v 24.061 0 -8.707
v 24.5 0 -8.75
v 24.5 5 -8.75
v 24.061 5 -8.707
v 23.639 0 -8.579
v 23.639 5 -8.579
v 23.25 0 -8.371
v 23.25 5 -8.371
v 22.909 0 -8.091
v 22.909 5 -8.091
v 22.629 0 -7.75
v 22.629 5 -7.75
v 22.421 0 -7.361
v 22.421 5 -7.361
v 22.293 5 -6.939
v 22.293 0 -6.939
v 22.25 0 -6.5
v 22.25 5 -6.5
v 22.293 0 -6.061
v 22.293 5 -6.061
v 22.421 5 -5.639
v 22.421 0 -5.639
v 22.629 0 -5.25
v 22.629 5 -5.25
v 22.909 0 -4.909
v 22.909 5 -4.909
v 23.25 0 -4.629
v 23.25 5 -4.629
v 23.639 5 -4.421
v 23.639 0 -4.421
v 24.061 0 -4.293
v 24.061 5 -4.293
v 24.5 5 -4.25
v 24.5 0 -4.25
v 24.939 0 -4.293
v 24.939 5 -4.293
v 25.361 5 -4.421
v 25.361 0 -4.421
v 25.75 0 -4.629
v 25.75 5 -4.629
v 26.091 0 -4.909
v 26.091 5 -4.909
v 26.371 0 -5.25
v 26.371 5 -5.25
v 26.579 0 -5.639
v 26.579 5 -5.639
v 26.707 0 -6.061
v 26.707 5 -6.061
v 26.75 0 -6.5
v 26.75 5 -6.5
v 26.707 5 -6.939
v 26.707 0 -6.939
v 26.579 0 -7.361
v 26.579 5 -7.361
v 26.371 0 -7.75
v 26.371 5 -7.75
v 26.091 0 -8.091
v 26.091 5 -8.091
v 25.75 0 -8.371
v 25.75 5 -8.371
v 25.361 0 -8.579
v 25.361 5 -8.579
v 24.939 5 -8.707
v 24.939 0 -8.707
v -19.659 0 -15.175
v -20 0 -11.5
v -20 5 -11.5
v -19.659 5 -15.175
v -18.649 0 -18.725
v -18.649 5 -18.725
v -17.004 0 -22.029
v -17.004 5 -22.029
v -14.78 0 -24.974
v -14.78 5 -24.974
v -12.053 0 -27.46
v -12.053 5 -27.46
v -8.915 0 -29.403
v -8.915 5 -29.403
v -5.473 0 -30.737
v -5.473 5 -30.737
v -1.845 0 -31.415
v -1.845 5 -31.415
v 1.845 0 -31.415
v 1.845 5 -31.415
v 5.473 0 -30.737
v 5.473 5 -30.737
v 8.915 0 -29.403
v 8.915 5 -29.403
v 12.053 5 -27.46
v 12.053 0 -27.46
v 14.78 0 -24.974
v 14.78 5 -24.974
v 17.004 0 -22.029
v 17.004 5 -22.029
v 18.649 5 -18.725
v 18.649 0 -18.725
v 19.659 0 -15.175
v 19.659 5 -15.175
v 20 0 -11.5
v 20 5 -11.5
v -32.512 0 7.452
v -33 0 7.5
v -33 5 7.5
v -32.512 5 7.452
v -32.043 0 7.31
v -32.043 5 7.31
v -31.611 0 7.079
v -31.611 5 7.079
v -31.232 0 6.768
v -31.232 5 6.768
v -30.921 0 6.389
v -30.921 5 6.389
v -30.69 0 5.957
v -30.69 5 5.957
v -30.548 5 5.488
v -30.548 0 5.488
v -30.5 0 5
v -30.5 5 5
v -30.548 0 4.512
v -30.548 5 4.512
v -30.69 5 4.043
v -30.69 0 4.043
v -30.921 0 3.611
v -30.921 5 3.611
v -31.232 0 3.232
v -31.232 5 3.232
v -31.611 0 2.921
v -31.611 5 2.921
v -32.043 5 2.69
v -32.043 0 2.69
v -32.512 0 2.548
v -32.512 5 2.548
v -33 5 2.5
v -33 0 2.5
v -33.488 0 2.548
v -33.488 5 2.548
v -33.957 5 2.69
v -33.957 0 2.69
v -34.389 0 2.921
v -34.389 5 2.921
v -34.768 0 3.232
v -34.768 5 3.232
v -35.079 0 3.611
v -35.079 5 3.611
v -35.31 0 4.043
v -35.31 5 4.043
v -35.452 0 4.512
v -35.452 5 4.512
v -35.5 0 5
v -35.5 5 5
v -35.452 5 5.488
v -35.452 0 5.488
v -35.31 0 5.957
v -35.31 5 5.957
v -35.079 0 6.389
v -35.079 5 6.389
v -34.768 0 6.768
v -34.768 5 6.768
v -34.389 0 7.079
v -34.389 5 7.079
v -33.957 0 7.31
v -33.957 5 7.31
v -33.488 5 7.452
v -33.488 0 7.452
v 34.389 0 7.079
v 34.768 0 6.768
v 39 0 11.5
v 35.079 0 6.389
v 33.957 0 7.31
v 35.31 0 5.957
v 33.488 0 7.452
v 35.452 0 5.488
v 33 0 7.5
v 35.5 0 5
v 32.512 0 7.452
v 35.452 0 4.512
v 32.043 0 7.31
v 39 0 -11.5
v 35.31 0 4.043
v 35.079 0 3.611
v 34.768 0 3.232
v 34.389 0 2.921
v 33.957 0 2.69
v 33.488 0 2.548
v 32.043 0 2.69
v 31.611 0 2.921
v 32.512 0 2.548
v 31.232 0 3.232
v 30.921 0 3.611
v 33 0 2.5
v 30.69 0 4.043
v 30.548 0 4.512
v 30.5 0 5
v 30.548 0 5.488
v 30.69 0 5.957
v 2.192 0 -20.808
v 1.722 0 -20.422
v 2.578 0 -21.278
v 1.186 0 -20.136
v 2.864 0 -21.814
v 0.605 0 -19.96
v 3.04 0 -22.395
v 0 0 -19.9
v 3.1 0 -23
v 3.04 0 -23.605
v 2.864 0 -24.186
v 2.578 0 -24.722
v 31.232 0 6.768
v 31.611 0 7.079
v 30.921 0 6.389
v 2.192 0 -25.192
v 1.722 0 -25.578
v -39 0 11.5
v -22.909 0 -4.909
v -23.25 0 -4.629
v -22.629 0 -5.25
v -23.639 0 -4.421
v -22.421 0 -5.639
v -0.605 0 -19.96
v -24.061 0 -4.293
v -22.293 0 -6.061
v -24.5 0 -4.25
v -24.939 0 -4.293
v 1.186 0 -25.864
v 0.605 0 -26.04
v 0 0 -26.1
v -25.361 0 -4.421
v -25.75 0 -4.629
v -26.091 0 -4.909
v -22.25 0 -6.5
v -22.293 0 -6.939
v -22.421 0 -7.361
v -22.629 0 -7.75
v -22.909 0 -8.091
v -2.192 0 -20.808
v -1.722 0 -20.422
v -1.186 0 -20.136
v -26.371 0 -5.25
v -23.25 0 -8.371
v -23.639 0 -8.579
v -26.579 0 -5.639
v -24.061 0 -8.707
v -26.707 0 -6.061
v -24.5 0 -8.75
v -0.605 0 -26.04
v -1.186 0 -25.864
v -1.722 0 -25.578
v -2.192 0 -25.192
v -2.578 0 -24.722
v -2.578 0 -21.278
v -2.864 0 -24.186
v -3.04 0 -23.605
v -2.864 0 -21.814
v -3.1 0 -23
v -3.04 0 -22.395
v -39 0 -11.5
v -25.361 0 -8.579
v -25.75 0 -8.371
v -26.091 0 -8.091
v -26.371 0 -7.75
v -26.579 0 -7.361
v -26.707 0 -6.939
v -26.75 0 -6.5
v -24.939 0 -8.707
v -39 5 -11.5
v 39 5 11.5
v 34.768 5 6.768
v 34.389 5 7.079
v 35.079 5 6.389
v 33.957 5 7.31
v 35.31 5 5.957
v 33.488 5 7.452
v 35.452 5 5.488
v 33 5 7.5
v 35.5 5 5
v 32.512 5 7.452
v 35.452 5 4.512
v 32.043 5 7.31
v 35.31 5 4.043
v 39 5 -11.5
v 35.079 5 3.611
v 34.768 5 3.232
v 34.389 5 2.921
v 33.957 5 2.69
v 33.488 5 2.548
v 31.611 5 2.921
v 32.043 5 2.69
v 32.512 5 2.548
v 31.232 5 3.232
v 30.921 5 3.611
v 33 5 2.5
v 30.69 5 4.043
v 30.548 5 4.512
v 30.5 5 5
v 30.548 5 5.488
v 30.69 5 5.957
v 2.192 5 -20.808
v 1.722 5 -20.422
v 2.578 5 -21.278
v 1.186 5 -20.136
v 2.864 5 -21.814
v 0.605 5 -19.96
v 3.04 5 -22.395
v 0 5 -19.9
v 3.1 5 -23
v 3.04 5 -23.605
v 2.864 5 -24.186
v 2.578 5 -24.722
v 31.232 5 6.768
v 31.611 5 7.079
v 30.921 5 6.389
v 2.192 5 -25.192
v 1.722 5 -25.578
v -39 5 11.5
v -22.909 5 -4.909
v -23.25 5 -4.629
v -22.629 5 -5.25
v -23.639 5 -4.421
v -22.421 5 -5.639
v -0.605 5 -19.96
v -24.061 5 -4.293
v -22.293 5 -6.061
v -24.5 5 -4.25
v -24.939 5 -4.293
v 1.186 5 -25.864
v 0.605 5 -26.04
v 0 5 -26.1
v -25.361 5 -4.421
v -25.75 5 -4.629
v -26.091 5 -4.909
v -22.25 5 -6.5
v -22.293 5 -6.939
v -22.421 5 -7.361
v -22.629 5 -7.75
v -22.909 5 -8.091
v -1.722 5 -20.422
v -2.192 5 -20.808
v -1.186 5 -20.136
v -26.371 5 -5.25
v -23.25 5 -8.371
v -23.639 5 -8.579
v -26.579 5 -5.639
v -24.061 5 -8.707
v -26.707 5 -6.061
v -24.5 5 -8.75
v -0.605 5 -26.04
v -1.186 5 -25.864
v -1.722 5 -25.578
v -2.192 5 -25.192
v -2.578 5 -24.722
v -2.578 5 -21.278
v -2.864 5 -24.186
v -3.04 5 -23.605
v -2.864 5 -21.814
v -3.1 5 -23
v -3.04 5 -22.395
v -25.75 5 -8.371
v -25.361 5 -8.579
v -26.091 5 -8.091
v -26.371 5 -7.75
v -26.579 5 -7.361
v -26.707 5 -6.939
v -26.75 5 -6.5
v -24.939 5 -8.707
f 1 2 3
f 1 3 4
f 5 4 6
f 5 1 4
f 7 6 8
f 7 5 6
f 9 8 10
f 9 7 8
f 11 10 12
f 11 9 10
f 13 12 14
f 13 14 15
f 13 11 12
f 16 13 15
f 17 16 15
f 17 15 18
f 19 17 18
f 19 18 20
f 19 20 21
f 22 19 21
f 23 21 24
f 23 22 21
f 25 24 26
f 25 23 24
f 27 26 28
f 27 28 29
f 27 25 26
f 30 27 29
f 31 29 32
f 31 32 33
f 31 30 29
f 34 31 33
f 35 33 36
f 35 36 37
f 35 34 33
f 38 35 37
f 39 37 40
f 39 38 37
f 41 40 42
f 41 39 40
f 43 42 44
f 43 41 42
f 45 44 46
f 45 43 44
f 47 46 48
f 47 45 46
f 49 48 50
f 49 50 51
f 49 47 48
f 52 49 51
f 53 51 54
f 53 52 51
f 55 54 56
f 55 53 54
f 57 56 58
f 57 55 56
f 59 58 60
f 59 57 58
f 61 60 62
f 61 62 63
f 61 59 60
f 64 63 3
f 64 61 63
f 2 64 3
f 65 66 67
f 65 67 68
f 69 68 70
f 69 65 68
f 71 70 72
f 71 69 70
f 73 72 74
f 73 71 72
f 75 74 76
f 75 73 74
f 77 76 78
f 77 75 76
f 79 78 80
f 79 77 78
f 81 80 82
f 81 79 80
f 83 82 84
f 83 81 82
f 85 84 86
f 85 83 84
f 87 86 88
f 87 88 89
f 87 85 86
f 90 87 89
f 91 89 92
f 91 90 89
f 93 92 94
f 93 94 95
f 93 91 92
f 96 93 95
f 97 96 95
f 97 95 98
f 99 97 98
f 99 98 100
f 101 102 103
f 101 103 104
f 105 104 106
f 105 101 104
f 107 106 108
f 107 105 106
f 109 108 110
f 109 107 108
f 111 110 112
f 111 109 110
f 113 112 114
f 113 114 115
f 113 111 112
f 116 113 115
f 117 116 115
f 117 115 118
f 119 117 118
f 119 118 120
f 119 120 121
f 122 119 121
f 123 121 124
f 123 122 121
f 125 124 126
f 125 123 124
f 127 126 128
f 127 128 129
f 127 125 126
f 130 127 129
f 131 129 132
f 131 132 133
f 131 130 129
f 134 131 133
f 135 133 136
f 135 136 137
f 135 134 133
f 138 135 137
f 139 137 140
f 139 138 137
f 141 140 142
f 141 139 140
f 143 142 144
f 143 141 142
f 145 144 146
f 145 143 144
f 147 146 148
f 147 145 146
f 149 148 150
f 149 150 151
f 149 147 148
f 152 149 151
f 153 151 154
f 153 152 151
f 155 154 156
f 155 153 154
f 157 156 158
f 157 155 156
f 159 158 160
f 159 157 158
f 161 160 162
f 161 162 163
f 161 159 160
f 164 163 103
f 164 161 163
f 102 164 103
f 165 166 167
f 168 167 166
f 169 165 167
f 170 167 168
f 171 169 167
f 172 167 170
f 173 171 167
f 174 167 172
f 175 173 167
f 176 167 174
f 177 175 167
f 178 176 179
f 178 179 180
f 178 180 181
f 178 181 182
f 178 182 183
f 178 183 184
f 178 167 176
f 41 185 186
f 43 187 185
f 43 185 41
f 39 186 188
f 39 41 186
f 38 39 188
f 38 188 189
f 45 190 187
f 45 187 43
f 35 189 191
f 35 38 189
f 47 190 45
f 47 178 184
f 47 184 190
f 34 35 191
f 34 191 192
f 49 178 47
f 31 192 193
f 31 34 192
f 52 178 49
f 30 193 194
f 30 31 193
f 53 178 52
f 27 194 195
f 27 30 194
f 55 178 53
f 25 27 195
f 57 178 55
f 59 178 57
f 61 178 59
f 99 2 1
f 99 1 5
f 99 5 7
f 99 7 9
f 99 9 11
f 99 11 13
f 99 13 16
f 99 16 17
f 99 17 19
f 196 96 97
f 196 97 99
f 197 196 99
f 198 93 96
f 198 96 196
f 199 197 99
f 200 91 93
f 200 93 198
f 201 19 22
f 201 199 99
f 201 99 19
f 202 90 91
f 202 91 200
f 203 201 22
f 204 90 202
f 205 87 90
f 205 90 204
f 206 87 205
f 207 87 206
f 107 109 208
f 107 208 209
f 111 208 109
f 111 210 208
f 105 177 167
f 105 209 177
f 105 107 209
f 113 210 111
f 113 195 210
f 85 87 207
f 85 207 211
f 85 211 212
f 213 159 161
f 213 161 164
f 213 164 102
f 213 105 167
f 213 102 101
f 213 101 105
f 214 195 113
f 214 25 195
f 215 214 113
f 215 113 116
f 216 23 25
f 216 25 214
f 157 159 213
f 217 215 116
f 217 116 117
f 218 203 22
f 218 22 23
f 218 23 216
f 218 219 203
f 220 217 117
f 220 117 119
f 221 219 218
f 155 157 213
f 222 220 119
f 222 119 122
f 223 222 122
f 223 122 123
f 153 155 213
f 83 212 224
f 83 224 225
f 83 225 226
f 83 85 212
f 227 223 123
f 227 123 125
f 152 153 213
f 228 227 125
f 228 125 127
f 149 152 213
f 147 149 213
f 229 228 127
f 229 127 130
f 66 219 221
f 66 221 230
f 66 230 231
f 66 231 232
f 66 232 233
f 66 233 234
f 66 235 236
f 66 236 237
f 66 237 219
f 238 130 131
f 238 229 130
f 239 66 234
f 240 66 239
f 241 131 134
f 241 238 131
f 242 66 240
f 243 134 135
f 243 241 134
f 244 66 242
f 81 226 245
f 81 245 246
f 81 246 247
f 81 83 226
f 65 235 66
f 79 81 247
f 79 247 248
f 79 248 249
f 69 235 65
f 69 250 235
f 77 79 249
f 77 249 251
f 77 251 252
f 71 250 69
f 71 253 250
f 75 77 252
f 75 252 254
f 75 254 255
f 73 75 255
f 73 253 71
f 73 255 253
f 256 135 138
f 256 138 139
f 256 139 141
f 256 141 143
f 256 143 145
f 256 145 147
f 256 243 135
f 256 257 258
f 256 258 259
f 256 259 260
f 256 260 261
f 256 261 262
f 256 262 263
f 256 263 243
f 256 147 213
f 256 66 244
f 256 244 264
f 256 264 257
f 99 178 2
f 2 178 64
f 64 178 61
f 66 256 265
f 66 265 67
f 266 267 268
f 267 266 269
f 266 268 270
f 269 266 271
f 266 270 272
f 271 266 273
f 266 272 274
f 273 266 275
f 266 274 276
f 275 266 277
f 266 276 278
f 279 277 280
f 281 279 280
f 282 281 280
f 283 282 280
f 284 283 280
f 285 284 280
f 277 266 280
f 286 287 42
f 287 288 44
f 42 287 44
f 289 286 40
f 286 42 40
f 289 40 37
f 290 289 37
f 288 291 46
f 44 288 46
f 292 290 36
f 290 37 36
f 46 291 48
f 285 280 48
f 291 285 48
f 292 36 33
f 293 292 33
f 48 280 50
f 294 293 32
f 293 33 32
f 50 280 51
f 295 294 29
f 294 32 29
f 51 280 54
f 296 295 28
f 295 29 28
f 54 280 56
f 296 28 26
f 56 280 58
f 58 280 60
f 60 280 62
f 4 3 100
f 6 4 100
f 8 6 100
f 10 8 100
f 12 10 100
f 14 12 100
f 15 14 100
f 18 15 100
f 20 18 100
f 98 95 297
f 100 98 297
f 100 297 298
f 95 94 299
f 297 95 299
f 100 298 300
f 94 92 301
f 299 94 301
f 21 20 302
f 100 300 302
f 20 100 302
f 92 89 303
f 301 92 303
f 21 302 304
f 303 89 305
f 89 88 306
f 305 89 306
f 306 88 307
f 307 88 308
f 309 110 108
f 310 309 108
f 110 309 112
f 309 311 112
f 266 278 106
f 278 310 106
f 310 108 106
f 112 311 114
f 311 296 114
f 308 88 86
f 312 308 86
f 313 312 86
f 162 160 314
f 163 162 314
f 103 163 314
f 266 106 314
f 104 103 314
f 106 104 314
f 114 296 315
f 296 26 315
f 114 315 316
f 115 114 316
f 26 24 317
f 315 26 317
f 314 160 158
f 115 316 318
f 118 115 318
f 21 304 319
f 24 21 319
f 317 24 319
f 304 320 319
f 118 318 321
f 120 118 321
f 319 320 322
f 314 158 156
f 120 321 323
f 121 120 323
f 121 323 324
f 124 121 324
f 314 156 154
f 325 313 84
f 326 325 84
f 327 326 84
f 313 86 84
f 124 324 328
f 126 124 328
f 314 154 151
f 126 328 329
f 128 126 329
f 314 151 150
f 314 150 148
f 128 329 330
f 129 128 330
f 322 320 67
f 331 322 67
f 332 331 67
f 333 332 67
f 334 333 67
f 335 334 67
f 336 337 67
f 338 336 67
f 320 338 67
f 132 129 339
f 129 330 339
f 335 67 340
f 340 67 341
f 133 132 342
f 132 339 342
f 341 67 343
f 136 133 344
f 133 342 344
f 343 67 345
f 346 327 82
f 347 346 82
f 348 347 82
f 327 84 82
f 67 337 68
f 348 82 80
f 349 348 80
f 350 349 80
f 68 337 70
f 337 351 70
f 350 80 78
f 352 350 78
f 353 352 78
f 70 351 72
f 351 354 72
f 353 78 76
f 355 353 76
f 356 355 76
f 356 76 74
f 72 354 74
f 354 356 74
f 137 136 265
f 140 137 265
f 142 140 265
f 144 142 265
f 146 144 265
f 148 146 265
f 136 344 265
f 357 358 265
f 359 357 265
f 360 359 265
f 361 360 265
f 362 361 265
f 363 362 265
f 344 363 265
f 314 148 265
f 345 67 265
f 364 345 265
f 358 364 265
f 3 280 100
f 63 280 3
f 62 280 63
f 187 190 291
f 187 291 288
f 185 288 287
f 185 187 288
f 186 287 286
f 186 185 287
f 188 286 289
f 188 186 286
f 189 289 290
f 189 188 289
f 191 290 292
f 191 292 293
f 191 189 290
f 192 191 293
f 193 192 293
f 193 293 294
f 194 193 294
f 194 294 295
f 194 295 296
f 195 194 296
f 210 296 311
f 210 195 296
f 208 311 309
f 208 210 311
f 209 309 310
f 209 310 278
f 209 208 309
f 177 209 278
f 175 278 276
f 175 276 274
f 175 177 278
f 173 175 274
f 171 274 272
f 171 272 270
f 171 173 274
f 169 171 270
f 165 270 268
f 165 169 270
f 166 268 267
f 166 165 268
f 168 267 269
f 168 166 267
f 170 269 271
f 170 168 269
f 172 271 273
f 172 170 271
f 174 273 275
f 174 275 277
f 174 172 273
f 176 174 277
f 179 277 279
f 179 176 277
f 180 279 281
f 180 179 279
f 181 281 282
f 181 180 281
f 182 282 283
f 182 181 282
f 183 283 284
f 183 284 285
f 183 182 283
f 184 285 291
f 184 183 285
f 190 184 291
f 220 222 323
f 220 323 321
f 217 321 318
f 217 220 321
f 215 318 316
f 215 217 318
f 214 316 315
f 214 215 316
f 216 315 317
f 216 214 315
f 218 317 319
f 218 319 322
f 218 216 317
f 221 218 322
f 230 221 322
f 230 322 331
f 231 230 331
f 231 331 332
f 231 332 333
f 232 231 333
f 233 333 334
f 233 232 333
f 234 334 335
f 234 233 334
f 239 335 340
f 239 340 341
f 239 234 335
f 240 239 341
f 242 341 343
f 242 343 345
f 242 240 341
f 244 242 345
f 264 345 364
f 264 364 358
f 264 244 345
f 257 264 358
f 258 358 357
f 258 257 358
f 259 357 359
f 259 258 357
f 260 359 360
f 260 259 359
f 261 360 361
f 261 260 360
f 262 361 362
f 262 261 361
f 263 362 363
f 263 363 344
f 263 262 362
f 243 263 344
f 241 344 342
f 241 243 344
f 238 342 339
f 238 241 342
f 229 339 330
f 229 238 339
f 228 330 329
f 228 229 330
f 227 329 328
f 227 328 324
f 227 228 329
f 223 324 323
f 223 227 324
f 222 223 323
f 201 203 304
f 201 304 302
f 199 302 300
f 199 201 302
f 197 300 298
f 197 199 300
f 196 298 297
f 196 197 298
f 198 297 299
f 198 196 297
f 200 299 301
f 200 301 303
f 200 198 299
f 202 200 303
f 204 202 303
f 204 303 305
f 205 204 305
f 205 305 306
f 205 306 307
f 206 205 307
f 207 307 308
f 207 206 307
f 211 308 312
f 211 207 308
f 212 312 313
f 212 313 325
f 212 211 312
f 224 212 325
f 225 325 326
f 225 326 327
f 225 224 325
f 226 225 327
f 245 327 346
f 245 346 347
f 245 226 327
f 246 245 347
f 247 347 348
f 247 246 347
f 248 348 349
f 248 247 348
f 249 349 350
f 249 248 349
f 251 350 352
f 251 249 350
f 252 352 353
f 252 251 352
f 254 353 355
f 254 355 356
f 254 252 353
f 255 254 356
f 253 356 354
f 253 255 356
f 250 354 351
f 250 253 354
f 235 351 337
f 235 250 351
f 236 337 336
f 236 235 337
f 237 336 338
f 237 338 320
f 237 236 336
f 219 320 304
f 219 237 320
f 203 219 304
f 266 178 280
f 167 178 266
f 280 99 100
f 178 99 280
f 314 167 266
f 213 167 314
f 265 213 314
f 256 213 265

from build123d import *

# Parameters (mm, degrees)
IZIM1_R                     = 3.1
IZIM1_R_2                   = 2.25
IZIM1_R_3                   = 2.5
Y_KSEKLIK_EKSTR_ZYON1_DEPTH = 5


with BuildPart() as part:
    # Çizim1 → Yükseklik-Ekstrüzyon1 (new body)
    with BuildSketch(Plane(origin=(0, 0, 0), x_dir=(1, 0, 0), z_dir=(0, 1, 0))):
        with BuildLine():
            Line((-39, 11.5), (-20, 11.5))
            ThreePointArc((-20, 11.5), (0, 31.5), (20, 11.5))
            Line((20, 11.5), (39, 11.5))
            Line((39, 11.5), (39, -11.5))
            Line((39, -11.5), (-39, -11.5))
            Line((-39, -11.5), (-39, 11.5))
        make_face()
        with Locations(Location((0, 23, 0), (0, 0, 270))):
            Circle(IZIM1_R, mode=Mode.SUBTRACT)
        with Locations(Location((-24.5, 6.5, 0), (0, 0, 270))):
            Circle(IZIM1_R_2, mode=Mode.SUBTRACT)
        with Locations(Location((-33, -5, 0), (0, 0, 270))):
            Circle(IZIM1_R_3, mode=Mode.SUBTRACT)
        with Locations(Location((33, -5, 0), (0, 0, 90))):
            Circle(IZIM1_R_3, mode=Mode.SUBTRACT)
        with Locations(Location((24.5, 6.5, 0), (0, 0, 90))):
            Circle(IZIM1_R_2, mode=Mode.SUBTRACT)
    extrude(amount=Y_KSEKLIK_EKSTR_ZYON1_DEPTH)


solid = part.part
